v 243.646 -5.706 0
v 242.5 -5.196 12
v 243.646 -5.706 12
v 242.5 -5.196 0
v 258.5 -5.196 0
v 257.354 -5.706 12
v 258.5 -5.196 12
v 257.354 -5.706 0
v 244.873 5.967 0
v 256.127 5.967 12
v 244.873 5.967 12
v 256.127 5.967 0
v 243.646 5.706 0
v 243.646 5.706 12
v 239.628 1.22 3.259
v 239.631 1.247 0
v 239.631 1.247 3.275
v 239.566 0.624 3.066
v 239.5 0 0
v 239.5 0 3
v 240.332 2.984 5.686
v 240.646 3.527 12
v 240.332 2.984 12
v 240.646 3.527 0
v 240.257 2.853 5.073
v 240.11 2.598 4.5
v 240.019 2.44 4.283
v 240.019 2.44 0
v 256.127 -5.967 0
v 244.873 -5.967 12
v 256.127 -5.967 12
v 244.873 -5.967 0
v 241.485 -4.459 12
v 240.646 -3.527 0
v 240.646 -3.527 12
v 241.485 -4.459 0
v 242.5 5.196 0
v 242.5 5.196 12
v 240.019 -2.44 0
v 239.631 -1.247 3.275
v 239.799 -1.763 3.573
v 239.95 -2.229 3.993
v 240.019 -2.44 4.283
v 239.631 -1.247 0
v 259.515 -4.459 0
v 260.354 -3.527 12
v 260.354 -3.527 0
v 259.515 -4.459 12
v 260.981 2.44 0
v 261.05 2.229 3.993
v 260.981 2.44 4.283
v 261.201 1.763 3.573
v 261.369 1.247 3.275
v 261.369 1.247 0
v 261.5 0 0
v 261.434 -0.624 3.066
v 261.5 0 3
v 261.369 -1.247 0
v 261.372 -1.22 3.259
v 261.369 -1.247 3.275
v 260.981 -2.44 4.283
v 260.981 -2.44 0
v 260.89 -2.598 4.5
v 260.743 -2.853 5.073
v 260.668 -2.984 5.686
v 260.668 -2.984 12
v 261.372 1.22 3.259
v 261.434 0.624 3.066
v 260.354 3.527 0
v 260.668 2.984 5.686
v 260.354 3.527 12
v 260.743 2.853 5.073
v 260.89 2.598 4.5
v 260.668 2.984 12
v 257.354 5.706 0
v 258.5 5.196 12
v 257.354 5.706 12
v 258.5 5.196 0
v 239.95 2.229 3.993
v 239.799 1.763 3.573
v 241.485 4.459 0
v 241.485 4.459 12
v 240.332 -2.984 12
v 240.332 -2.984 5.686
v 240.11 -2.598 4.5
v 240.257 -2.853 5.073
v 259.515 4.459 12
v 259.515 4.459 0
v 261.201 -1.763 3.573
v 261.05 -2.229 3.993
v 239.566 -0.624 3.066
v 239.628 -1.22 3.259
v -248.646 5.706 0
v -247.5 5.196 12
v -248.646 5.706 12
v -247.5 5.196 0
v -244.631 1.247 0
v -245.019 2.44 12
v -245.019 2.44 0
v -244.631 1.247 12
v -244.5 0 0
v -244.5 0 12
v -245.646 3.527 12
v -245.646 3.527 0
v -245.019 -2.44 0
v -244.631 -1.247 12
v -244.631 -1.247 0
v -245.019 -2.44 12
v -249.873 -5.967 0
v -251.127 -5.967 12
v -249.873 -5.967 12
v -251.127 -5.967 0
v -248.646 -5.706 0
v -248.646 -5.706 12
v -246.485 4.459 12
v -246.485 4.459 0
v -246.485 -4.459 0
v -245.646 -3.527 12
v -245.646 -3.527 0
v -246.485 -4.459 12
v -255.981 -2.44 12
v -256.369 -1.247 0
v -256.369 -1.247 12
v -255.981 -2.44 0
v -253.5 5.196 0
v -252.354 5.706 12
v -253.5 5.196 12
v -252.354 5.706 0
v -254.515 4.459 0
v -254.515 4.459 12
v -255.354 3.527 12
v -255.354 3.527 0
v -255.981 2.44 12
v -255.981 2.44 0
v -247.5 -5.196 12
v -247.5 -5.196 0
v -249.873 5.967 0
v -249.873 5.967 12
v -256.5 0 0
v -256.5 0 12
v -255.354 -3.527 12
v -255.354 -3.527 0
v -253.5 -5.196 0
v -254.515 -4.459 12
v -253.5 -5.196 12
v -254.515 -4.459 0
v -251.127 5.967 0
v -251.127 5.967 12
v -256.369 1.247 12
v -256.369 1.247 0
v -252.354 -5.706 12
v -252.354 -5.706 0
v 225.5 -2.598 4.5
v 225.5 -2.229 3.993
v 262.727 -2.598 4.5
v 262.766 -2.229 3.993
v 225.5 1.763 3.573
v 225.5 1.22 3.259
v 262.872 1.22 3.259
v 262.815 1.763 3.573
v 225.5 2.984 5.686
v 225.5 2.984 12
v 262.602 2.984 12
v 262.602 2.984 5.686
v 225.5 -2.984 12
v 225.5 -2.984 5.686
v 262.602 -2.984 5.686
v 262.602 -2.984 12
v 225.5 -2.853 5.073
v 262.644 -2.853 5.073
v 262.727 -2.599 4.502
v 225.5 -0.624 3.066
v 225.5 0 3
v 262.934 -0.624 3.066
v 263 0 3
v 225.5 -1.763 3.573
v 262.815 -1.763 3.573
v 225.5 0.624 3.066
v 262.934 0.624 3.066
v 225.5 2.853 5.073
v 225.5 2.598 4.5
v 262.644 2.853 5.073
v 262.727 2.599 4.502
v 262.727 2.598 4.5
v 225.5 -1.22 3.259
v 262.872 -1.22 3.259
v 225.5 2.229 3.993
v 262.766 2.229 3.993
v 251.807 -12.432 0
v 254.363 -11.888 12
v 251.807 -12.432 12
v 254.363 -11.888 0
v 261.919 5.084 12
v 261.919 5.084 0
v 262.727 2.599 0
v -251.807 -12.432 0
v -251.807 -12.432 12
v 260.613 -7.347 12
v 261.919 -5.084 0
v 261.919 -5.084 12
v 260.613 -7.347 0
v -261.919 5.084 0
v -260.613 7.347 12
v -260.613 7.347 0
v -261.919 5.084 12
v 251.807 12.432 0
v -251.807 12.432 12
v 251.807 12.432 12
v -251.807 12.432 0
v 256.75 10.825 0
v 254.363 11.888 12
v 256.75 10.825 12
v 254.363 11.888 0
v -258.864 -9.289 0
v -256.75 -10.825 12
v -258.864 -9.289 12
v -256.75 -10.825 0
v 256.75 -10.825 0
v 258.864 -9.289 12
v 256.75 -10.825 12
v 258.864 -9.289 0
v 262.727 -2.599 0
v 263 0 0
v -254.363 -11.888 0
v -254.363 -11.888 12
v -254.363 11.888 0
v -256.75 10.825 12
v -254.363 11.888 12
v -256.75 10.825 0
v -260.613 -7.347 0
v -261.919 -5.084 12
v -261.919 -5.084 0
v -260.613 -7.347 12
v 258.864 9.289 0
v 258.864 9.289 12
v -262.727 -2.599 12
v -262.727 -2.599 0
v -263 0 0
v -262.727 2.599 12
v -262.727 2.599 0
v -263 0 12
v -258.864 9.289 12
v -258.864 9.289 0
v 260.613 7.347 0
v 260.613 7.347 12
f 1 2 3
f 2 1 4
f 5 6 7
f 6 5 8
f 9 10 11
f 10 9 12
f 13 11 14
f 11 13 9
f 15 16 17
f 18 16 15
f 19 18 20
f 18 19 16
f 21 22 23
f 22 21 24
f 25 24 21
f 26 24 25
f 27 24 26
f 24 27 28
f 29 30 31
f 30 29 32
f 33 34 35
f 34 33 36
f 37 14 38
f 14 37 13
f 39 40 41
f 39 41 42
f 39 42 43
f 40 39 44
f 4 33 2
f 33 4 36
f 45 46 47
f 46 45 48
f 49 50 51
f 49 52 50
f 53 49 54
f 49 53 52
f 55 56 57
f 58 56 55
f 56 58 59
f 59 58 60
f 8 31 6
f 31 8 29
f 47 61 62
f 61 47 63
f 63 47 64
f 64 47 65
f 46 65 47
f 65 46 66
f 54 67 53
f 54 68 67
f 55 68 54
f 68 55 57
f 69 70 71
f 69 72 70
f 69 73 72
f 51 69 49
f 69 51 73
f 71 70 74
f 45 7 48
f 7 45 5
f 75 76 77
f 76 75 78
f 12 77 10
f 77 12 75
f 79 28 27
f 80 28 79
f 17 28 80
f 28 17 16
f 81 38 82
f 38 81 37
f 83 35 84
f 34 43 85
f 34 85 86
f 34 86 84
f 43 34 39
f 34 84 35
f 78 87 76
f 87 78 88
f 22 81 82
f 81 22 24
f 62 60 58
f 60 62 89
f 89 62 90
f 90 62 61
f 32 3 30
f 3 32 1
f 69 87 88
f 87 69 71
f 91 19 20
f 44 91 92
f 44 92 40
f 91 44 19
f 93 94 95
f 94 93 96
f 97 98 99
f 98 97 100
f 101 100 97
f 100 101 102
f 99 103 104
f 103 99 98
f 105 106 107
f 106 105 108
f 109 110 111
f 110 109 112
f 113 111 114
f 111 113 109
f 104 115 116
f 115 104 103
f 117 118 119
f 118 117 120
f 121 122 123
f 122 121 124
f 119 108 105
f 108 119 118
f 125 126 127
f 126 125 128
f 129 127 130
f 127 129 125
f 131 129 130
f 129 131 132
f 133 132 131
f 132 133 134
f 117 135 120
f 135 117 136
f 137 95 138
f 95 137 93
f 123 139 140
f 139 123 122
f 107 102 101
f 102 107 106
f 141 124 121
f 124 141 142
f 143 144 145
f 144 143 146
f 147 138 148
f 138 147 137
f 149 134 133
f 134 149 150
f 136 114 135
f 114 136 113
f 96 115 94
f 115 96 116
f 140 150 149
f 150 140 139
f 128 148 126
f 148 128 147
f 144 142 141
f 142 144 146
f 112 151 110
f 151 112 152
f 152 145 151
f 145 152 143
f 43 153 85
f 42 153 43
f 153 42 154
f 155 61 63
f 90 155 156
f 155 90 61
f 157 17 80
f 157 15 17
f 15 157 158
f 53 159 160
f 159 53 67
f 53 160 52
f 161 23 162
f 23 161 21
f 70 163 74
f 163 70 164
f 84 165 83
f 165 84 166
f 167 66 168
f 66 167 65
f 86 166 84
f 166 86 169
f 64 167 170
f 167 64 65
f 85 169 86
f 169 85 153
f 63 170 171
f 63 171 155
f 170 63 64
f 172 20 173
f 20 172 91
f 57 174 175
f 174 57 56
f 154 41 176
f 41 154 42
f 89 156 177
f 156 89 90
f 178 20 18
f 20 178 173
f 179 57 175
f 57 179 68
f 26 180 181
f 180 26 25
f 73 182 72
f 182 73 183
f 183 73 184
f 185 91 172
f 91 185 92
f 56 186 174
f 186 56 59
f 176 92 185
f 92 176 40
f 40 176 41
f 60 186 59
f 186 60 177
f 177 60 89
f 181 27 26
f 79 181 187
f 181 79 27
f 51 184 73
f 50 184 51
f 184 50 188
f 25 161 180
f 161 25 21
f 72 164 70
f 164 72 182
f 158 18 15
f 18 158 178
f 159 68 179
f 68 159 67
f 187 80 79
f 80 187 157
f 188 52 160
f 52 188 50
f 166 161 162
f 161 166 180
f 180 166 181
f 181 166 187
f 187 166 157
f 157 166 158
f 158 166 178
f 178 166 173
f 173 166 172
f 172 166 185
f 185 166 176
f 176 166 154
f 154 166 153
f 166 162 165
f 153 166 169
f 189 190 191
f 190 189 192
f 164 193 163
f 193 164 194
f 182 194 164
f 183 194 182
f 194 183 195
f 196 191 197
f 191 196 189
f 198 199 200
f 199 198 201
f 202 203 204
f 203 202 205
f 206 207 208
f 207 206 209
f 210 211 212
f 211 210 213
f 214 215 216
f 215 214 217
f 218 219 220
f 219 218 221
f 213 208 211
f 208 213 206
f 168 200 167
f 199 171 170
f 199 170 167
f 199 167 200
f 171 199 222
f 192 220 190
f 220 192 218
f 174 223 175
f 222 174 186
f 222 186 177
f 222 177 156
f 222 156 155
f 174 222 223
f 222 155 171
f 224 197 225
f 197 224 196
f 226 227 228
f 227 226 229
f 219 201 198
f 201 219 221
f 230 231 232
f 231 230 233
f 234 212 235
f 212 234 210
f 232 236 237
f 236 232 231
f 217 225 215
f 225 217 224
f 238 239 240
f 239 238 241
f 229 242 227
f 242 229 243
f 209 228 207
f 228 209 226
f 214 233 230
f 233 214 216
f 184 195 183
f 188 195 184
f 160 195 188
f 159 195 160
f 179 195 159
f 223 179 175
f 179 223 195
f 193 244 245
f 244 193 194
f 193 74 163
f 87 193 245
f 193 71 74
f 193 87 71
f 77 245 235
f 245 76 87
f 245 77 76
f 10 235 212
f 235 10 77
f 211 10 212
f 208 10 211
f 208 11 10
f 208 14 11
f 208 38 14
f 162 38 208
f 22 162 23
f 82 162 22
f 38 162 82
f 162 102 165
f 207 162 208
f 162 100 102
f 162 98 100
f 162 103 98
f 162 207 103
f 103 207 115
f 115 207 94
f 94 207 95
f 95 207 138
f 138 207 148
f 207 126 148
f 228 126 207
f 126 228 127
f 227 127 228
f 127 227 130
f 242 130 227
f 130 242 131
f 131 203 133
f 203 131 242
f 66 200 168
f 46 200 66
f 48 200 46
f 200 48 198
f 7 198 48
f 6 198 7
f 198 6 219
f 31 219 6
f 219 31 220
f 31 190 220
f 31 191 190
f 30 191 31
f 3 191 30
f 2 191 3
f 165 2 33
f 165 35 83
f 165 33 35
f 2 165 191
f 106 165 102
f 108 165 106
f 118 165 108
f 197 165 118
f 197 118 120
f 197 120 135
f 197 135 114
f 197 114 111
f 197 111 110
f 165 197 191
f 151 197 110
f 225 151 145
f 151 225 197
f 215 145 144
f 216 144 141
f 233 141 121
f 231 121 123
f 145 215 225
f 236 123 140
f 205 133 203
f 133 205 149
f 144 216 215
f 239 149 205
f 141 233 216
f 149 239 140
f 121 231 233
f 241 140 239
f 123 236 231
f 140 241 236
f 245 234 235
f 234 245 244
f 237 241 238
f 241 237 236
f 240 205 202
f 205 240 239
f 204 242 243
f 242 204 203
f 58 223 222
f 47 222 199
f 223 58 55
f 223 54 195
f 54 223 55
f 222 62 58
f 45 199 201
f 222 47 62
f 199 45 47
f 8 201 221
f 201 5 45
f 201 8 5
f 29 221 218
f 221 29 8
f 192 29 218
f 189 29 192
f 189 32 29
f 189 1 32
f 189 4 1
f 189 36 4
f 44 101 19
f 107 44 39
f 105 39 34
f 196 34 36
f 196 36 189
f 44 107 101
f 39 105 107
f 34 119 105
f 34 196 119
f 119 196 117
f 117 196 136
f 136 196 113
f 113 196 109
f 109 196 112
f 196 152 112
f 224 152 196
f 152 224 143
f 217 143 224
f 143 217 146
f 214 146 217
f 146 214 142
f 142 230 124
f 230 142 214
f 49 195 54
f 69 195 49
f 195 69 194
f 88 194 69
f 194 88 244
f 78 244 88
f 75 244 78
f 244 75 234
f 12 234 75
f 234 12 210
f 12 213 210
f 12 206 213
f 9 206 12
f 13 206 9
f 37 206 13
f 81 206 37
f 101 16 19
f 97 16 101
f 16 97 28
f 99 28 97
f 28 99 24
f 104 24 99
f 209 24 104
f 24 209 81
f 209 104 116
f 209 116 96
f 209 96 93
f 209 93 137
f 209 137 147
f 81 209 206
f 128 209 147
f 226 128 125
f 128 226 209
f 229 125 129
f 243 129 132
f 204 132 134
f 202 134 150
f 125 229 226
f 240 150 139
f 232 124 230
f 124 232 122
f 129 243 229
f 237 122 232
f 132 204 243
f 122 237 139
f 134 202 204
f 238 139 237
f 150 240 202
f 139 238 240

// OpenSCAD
// universal values
$fn = 30;
eps = 0.1;

// rough measurements from a S1 2014 3D printer
machine_height = 563;  // measured from metal body without acrylic sidepanel
machine_depth = 467; // measured from top arms to back.
machine_width = 435;  // measured between metal body arms
arm_height= 58; // metal body arms measured along outside top to lower side 
arm_width = 41;  // metal body arms measured across the top
side_panel_mount_screw_dist_TB = 501;  // top to bottom
side_panel_mount_screw_dist_FB = 371;   // front to back



// S1 2014 retrofit improvements checklist
//
//replace the wiring for motion
//brace the arms for tramming - allow controlled hoz and ver alignment over +/-4mm
//replace the build platform insert with a 3 point mounter version
//upgrade the gantry to reduce vibration
//replace the platform with 3 point system for easy adjustment
//drill out a set of mounting holes on the back
//fasten the vertical rods at the back of the machine
//reduce dust, debris and thermal interferance




module brace_arm(length=2,thickness=1,brace_OD=1,brace_ID=0.25){
    difference(){   
        hull(){
           translate([length/2,0,0] )cylinder(r=brace_OD/2,h=thickness);
           translate([-length/2,0,0])cylinder(r=brace_OD/2,h=thickness);
        }
        union(){
            hull(){
               translate([length/2+5,0,-thickness/2] )cylinder(r=brace_ID/2,h=thickness*2);
               translate([length/2-5,0,-thickness/2] )cylinder(r=brace_ID/2,h=thickness*2);
            }
           translate([-length/2,0,-thickness/2] )cylinder(r=brace_ID/2,h=thickness*2);
  
            hull(){
            translate([length/2-25,0,thickness/2])rotate([0,90,0])cylinder(r=brace_ID/4,h=brace_ID+26);
            translate([length/2-25,0,thickness])rotate([0,90,0])cylinder(r=brace_ID/4,h=brace_ID+26);
            }
                }
    }
}
    
brace_arm(side_panel_mount_screw_dist_TB,12,25,12);
